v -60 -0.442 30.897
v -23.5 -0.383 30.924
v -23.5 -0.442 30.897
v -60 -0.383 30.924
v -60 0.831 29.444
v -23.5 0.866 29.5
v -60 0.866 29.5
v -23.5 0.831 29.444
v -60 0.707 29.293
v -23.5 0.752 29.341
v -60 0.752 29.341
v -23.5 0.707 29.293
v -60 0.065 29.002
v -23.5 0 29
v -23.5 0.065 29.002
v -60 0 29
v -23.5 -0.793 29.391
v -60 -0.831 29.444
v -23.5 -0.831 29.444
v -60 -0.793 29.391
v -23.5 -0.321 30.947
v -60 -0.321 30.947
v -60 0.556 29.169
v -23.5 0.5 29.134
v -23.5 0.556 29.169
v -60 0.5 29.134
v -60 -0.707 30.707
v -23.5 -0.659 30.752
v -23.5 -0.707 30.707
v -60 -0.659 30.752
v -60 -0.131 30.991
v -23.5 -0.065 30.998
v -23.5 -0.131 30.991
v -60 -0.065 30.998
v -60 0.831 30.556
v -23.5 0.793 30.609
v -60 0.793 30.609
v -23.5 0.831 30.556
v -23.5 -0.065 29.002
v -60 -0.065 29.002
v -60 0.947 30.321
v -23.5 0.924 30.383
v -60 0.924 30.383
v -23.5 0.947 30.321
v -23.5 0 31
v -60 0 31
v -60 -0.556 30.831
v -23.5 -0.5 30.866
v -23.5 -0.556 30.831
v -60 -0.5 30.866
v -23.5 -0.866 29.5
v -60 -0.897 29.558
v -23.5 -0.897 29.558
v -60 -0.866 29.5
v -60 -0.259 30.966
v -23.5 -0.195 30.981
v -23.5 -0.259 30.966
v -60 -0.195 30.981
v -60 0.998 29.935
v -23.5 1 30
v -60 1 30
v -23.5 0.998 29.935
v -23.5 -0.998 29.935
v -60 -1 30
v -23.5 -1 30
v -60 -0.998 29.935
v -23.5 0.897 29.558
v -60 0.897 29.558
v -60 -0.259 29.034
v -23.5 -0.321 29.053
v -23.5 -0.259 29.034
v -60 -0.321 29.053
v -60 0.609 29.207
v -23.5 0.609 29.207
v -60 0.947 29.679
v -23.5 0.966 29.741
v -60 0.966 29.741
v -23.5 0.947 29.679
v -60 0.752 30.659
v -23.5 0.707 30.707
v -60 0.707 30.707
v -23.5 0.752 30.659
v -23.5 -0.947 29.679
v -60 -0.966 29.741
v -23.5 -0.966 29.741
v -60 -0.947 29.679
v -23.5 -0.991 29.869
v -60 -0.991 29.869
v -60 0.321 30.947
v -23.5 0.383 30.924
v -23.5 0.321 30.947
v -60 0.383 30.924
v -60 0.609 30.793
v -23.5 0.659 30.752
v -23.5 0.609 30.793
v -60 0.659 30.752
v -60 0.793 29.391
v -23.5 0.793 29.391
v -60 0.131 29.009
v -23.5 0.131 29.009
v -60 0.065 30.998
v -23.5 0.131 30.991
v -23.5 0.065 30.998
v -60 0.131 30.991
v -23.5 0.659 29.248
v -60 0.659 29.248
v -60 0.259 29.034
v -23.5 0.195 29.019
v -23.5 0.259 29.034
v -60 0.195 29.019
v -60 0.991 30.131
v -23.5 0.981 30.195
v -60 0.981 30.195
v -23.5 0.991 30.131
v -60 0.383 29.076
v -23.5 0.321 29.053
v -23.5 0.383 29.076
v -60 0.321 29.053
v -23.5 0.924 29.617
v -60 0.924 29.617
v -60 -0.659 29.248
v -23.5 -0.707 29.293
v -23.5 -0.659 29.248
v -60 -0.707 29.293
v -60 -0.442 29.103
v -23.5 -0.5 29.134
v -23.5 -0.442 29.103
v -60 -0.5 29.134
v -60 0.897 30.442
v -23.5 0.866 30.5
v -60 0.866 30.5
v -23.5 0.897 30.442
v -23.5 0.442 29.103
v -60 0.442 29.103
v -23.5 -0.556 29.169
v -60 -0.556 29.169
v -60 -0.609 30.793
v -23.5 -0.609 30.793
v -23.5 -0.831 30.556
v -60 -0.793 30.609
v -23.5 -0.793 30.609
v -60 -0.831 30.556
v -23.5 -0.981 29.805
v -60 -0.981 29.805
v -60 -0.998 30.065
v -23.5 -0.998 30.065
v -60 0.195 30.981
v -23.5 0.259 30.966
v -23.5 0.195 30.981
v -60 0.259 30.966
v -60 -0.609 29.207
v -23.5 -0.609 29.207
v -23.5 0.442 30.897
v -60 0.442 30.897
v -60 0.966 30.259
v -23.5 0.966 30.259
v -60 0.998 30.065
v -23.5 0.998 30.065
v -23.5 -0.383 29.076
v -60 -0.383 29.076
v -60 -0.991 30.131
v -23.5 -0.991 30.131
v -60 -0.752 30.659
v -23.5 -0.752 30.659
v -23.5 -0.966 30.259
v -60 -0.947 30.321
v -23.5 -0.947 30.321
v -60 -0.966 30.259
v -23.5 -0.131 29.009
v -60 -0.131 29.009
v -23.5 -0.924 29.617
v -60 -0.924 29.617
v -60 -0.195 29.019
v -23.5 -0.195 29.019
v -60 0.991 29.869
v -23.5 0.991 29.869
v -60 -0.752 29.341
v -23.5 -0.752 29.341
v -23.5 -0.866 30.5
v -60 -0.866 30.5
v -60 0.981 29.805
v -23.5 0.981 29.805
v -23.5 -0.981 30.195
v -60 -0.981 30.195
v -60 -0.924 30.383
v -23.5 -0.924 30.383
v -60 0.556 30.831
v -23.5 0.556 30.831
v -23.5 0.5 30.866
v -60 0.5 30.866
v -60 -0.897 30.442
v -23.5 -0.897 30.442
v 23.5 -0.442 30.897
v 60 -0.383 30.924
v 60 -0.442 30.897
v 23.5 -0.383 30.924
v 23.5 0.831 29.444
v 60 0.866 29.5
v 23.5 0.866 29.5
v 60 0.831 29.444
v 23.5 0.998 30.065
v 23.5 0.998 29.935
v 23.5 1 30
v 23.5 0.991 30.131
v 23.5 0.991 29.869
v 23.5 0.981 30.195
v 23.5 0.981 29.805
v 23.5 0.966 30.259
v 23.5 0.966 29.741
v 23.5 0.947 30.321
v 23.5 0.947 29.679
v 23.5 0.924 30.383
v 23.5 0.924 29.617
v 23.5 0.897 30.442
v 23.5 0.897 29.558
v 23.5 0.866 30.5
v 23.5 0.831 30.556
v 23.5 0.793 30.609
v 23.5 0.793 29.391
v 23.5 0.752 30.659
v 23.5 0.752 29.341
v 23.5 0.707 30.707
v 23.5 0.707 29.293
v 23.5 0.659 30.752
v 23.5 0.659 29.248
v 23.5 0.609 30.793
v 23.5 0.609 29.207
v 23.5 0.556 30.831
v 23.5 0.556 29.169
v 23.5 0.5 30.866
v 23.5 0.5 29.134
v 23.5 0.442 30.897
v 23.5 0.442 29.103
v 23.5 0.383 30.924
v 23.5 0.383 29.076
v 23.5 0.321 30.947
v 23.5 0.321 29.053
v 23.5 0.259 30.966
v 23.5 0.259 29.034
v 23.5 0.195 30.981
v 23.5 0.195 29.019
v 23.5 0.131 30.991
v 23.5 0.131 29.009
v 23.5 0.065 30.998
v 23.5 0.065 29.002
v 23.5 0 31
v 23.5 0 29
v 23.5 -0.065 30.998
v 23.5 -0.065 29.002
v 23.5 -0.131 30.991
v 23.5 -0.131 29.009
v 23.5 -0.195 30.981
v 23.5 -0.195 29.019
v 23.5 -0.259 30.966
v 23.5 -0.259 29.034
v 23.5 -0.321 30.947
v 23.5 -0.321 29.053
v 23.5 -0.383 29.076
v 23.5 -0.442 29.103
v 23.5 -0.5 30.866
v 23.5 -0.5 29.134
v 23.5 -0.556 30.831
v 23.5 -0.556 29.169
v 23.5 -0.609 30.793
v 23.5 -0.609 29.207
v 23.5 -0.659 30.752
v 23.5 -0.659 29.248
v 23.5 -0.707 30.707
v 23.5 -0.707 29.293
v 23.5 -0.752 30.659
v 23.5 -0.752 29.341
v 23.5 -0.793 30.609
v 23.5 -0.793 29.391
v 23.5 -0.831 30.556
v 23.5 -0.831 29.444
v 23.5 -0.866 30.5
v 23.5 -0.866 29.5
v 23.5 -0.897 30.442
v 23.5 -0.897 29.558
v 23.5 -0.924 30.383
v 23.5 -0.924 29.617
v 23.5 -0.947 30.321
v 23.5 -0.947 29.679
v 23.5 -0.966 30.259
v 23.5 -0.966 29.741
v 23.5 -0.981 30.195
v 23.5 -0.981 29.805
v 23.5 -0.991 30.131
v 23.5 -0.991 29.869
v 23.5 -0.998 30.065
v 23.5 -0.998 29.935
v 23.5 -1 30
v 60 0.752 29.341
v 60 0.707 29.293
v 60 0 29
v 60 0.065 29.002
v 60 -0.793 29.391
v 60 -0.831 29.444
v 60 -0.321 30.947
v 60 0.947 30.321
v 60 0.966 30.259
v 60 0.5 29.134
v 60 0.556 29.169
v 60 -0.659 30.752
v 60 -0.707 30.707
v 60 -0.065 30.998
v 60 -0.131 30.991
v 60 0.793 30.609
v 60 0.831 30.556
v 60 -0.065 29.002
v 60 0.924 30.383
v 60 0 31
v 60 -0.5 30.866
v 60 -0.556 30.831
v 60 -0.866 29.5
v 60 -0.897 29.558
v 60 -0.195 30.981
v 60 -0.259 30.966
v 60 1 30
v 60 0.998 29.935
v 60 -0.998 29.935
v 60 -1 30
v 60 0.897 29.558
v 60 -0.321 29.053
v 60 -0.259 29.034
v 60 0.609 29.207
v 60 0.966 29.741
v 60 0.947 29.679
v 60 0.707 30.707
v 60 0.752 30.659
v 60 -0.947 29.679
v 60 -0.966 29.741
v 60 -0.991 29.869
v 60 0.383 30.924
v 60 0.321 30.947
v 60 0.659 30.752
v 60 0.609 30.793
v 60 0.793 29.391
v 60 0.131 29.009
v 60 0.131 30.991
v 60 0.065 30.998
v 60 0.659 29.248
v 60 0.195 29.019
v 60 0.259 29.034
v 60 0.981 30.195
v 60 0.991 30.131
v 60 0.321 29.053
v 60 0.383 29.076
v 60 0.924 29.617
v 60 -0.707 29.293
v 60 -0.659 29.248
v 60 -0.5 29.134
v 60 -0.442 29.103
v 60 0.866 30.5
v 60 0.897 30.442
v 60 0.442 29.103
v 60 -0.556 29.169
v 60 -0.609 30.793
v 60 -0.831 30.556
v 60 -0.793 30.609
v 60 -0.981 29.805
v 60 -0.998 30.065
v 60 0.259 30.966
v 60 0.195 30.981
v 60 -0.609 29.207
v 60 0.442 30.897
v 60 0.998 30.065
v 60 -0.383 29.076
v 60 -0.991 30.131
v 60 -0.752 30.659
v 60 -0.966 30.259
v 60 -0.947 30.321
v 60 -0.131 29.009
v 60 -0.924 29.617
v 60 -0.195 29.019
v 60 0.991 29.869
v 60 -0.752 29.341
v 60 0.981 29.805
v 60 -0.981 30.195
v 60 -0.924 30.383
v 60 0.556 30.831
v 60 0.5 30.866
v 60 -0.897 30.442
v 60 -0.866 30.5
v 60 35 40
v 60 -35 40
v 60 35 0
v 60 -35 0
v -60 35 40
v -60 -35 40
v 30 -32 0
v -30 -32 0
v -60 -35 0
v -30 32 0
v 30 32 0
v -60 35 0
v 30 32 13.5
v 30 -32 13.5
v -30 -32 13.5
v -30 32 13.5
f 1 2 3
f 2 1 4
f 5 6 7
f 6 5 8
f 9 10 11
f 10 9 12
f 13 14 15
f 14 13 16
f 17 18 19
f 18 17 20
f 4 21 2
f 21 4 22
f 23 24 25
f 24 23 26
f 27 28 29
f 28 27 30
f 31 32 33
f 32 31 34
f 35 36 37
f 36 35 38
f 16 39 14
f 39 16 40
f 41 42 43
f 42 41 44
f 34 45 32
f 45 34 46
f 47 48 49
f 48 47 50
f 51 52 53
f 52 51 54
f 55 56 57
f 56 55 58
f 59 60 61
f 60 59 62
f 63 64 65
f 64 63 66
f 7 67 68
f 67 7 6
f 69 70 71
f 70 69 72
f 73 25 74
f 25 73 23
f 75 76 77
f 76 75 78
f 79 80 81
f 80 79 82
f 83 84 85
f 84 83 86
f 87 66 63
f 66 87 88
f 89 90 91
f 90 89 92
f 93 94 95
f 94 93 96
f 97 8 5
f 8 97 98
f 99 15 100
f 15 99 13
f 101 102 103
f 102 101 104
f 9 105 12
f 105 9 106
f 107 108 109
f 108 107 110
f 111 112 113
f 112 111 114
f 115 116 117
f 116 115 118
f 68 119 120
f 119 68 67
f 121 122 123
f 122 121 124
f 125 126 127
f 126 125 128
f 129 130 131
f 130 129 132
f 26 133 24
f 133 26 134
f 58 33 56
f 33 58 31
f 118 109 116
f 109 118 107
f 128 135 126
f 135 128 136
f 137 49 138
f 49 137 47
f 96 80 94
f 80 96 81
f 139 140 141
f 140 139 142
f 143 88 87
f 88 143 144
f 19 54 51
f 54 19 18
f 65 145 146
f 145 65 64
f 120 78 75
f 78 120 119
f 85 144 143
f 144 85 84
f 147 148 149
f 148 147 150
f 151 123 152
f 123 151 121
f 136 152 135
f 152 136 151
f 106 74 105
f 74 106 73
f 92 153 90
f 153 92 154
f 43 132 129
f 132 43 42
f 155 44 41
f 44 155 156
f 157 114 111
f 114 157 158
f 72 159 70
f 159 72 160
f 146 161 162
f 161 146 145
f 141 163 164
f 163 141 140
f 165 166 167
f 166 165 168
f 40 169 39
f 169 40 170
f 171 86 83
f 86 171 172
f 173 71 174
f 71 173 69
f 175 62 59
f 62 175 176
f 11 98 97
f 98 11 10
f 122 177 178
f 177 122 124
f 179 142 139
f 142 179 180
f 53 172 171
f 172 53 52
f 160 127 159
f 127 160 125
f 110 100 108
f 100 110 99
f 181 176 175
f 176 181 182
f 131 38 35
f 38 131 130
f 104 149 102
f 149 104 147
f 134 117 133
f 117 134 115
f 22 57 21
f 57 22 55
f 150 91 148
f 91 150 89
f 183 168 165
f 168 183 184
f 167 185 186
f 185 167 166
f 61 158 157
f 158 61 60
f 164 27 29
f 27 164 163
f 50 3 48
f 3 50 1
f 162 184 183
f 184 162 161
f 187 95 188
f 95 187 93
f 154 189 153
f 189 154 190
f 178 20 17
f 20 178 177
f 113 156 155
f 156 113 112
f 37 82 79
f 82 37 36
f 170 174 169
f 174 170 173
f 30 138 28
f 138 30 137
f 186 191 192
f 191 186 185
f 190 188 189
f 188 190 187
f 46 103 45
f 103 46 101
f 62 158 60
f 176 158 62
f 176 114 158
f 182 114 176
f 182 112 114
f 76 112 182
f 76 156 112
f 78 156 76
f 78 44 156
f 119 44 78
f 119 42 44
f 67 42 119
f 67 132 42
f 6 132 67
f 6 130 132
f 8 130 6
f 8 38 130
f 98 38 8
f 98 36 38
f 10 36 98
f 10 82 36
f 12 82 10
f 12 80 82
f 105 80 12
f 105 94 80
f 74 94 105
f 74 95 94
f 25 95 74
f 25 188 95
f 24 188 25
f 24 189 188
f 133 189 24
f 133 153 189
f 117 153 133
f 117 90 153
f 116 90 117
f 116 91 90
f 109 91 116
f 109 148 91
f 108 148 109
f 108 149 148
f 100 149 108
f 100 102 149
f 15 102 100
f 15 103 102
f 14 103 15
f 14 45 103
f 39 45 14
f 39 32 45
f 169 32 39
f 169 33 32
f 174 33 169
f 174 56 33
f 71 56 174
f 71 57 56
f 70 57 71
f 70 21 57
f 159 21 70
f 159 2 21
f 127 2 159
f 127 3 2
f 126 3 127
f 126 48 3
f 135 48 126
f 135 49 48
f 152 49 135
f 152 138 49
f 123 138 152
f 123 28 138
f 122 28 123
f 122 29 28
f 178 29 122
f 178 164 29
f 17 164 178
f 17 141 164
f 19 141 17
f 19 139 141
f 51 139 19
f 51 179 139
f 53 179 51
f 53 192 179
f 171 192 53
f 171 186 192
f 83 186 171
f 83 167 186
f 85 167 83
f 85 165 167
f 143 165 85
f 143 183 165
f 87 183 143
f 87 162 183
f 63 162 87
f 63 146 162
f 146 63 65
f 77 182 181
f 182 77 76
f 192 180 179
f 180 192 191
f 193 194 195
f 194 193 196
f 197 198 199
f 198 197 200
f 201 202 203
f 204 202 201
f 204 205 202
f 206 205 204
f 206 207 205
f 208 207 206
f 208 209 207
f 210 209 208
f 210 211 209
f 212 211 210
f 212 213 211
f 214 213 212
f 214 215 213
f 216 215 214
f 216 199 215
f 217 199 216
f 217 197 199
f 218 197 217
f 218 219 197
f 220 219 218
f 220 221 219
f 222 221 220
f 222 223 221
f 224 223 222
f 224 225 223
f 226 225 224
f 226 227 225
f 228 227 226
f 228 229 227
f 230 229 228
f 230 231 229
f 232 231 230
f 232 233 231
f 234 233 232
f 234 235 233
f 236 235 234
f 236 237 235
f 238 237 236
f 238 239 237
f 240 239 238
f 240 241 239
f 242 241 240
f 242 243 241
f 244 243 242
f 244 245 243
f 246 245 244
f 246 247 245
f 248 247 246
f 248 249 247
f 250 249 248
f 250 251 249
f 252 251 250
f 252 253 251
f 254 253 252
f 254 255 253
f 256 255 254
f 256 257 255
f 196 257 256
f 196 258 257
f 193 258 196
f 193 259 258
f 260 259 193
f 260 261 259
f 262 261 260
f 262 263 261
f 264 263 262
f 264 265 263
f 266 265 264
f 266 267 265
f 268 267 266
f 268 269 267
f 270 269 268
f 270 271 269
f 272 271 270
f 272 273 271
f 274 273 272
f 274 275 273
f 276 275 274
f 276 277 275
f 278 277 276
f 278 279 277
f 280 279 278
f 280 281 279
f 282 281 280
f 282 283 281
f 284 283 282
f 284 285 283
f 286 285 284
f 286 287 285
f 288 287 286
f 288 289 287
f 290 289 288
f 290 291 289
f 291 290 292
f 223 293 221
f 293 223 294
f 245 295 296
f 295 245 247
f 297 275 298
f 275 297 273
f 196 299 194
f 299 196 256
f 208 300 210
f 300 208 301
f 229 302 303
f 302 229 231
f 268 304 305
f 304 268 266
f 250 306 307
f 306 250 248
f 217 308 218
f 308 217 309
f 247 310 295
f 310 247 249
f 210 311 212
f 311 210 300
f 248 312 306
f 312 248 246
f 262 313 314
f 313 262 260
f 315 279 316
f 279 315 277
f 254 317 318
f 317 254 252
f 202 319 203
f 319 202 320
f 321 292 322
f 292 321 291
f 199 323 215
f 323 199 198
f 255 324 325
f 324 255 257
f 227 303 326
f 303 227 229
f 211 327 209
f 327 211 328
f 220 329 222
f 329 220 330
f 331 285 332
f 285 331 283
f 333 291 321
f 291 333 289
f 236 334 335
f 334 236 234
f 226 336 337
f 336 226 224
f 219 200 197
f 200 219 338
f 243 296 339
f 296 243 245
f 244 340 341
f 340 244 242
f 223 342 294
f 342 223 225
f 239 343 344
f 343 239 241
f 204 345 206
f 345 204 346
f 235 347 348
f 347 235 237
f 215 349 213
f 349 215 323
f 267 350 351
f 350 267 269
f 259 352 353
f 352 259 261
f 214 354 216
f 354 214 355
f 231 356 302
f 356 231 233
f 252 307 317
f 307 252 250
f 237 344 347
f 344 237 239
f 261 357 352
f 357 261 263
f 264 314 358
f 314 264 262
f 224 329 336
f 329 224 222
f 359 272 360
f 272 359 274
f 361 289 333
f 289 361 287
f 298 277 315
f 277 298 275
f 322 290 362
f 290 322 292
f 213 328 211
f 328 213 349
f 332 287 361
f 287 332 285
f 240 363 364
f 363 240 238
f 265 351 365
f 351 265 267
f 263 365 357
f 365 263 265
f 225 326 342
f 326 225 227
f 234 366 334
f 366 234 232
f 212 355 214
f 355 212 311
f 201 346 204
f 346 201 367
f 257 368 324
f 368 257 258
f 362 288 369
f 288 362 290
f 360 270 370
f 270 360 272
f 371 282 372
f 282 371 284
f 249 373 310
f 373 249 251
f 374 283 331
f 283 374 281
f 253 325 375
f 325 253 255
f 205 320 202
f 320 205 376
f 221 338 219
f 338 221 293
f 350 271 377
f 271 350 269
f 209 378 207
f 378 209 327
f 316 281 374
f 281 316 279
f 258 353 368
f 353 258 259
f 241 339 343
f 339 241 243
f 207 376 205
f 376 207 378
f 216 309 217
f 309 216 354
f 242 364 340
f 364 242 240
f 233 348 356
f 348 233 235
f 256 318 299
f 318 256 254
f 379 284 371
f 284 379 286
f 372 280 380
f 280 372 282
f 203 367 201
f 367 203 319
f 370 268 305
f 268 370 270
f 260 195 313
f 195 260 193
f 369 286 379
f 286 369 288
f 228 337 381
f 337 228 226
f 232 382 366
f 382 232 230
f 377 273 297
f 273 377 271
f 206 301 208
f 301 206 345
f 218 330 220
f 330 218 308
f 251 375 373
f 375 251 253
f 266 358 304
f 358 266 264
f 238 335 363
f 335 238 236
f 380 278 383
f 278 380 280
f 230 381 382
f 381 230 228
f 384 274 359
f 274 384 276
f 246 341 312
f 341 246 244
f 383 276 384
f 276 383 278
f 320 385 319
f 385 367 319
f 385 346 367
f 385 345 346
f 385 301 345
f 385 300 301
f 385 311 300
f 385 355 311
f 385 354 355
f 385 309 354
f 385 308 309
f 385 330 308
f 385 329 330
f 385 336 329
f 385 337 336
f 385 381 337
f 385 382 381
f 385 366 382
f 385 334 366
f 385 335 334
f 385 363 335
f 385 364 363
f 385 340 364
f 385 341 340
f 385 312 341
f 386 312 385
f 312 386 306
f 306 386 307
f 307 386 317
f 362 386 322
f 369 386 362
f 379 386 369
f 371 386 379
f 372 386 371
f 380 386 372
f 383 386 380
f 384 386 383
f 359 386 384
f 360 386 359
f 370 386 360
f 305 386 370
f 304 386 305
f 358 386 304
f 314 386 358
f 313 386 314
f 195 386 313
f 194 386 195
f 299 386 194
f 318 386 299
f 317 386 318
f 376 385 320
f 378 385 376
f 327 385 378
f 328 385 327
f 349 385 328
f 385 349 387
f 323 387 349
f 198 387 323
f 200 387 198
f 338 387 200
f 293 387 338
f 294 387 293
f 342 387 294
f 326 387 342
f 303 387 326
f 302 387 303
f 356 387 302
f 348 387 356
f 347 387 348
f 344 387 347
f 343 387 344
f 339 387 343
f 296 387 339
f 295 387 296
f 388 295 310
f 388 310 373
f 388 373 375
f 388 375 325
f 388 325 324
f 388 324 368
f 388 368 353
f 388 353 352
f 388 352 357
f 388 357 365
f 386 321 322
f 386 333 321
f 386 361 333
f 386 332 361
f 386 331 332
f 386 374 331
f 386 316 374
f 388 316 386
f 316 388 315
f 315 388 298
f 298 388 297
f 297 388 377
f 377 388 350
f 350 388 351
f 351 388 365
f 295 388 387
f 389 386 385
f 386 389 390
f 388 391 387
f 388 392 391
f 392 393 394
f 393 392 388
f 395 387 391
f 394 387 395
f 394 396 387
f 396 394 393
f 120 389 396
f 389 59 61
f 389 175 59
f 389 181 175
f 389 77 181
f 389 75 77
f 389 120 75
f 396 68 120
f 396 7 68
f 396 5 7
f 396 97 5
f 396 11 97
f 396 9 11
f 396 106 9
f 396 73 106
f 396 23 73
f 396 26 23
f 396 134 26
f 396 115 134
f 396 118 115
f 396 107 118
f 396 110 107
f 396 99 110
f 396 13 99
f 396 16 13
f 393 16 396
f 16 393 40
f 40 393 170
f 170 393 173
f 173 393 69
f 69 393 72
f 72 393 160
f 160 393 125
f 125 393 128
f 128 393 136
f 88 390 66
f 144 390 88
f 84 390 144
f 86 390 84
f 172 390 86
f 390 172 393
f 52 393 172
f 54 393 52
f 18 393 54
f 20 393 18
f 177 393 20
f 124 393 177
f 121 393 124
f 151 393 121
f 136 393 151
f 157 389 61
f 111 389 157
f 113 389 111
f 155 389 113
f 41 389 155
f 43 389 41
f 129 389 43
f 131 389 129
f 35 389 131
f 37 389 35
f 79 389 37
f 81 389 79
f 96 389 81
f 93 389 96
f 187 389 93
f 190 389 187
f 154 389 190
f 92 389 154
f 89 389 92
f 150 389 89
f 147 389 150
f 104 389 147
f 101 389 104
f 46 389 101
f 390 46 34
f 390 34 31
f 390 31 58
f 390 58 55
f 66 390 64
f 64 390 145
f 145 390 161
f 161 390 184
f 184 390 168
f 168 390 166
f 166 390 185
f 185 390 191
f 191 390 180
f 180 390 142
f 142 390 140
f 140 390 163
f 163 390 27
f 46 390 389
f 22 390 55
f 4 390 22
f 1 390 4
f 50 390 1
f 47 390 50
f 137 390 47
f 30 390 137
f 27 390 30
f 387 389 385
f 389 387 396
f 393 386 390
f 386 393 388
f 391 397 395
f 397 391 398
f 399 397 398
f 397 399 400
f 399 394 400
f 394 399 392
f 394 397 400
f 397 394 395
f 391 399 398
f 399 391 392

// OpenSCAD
// Mini horizontal gel-electrophoresis box - buffer tank
// Print orientation: tank rests on XY plane at z = 0, builds upward (+Z)

// ---------------- Parameters ----------------
tank_x      = 120;   // outer length in X (mm)
tank_y      = 70;    // outer width in Y (mm)
tank_h      = 40;    // outer height in Z (mm)
wall        = 3;     // wall thickness (mm)
floor       = 3;     // floor thickness (mm)

platform_x  = 60;    // platform length in X (mm), centred
platform_z  = 13;    // platform top height above inner floor (mm)
platform_y  = tank_y - 2 * wall;  // platform spans full inner width (mm)

hole_d      = 2;     // electrode hole diameter (mm)
hole_y      = 0;     // electrode hole Y position (mm)
hole_z      = 30;    // electrode hole Z position (mm)

eps         = 0.5;   // cutter overshoot past faces (mm)
$fn         = 96;    // curve resolution

// ---------------- Derived ----------------
inner_f = tank_h - floor;              // inner floor height (z = 3)
chamber_h = inner_f - platform_z;      // buffer chamber height above platform (z = 10)

// ---------------- Model ----------------
difference() {
    // Main tank body (open top)
    translate([-tank_x/2, -tank_y/2, 0])
        cube([tank_x, tank_y, tank_h]);

    // Raised central platform for gel tray
    translate([-platform_x/2, -platform_y/2, platform_z - chamber_h])
        cube([platform_x, platform_y, chamber_h + eps]);

    // Horizontal electrode holes through each end wall, along X
    for (sx = [-1, 1])
        translate([sx > 0 ? tank_x/2 - hole_d/2 : -tank_x/2 + hole_d/2,
                   hole_y,
                   hole_z])
            rotate([0, 90, 0])
                cylinder(d = hole_d, h = tank_y + 2*eps, center = true);
}
